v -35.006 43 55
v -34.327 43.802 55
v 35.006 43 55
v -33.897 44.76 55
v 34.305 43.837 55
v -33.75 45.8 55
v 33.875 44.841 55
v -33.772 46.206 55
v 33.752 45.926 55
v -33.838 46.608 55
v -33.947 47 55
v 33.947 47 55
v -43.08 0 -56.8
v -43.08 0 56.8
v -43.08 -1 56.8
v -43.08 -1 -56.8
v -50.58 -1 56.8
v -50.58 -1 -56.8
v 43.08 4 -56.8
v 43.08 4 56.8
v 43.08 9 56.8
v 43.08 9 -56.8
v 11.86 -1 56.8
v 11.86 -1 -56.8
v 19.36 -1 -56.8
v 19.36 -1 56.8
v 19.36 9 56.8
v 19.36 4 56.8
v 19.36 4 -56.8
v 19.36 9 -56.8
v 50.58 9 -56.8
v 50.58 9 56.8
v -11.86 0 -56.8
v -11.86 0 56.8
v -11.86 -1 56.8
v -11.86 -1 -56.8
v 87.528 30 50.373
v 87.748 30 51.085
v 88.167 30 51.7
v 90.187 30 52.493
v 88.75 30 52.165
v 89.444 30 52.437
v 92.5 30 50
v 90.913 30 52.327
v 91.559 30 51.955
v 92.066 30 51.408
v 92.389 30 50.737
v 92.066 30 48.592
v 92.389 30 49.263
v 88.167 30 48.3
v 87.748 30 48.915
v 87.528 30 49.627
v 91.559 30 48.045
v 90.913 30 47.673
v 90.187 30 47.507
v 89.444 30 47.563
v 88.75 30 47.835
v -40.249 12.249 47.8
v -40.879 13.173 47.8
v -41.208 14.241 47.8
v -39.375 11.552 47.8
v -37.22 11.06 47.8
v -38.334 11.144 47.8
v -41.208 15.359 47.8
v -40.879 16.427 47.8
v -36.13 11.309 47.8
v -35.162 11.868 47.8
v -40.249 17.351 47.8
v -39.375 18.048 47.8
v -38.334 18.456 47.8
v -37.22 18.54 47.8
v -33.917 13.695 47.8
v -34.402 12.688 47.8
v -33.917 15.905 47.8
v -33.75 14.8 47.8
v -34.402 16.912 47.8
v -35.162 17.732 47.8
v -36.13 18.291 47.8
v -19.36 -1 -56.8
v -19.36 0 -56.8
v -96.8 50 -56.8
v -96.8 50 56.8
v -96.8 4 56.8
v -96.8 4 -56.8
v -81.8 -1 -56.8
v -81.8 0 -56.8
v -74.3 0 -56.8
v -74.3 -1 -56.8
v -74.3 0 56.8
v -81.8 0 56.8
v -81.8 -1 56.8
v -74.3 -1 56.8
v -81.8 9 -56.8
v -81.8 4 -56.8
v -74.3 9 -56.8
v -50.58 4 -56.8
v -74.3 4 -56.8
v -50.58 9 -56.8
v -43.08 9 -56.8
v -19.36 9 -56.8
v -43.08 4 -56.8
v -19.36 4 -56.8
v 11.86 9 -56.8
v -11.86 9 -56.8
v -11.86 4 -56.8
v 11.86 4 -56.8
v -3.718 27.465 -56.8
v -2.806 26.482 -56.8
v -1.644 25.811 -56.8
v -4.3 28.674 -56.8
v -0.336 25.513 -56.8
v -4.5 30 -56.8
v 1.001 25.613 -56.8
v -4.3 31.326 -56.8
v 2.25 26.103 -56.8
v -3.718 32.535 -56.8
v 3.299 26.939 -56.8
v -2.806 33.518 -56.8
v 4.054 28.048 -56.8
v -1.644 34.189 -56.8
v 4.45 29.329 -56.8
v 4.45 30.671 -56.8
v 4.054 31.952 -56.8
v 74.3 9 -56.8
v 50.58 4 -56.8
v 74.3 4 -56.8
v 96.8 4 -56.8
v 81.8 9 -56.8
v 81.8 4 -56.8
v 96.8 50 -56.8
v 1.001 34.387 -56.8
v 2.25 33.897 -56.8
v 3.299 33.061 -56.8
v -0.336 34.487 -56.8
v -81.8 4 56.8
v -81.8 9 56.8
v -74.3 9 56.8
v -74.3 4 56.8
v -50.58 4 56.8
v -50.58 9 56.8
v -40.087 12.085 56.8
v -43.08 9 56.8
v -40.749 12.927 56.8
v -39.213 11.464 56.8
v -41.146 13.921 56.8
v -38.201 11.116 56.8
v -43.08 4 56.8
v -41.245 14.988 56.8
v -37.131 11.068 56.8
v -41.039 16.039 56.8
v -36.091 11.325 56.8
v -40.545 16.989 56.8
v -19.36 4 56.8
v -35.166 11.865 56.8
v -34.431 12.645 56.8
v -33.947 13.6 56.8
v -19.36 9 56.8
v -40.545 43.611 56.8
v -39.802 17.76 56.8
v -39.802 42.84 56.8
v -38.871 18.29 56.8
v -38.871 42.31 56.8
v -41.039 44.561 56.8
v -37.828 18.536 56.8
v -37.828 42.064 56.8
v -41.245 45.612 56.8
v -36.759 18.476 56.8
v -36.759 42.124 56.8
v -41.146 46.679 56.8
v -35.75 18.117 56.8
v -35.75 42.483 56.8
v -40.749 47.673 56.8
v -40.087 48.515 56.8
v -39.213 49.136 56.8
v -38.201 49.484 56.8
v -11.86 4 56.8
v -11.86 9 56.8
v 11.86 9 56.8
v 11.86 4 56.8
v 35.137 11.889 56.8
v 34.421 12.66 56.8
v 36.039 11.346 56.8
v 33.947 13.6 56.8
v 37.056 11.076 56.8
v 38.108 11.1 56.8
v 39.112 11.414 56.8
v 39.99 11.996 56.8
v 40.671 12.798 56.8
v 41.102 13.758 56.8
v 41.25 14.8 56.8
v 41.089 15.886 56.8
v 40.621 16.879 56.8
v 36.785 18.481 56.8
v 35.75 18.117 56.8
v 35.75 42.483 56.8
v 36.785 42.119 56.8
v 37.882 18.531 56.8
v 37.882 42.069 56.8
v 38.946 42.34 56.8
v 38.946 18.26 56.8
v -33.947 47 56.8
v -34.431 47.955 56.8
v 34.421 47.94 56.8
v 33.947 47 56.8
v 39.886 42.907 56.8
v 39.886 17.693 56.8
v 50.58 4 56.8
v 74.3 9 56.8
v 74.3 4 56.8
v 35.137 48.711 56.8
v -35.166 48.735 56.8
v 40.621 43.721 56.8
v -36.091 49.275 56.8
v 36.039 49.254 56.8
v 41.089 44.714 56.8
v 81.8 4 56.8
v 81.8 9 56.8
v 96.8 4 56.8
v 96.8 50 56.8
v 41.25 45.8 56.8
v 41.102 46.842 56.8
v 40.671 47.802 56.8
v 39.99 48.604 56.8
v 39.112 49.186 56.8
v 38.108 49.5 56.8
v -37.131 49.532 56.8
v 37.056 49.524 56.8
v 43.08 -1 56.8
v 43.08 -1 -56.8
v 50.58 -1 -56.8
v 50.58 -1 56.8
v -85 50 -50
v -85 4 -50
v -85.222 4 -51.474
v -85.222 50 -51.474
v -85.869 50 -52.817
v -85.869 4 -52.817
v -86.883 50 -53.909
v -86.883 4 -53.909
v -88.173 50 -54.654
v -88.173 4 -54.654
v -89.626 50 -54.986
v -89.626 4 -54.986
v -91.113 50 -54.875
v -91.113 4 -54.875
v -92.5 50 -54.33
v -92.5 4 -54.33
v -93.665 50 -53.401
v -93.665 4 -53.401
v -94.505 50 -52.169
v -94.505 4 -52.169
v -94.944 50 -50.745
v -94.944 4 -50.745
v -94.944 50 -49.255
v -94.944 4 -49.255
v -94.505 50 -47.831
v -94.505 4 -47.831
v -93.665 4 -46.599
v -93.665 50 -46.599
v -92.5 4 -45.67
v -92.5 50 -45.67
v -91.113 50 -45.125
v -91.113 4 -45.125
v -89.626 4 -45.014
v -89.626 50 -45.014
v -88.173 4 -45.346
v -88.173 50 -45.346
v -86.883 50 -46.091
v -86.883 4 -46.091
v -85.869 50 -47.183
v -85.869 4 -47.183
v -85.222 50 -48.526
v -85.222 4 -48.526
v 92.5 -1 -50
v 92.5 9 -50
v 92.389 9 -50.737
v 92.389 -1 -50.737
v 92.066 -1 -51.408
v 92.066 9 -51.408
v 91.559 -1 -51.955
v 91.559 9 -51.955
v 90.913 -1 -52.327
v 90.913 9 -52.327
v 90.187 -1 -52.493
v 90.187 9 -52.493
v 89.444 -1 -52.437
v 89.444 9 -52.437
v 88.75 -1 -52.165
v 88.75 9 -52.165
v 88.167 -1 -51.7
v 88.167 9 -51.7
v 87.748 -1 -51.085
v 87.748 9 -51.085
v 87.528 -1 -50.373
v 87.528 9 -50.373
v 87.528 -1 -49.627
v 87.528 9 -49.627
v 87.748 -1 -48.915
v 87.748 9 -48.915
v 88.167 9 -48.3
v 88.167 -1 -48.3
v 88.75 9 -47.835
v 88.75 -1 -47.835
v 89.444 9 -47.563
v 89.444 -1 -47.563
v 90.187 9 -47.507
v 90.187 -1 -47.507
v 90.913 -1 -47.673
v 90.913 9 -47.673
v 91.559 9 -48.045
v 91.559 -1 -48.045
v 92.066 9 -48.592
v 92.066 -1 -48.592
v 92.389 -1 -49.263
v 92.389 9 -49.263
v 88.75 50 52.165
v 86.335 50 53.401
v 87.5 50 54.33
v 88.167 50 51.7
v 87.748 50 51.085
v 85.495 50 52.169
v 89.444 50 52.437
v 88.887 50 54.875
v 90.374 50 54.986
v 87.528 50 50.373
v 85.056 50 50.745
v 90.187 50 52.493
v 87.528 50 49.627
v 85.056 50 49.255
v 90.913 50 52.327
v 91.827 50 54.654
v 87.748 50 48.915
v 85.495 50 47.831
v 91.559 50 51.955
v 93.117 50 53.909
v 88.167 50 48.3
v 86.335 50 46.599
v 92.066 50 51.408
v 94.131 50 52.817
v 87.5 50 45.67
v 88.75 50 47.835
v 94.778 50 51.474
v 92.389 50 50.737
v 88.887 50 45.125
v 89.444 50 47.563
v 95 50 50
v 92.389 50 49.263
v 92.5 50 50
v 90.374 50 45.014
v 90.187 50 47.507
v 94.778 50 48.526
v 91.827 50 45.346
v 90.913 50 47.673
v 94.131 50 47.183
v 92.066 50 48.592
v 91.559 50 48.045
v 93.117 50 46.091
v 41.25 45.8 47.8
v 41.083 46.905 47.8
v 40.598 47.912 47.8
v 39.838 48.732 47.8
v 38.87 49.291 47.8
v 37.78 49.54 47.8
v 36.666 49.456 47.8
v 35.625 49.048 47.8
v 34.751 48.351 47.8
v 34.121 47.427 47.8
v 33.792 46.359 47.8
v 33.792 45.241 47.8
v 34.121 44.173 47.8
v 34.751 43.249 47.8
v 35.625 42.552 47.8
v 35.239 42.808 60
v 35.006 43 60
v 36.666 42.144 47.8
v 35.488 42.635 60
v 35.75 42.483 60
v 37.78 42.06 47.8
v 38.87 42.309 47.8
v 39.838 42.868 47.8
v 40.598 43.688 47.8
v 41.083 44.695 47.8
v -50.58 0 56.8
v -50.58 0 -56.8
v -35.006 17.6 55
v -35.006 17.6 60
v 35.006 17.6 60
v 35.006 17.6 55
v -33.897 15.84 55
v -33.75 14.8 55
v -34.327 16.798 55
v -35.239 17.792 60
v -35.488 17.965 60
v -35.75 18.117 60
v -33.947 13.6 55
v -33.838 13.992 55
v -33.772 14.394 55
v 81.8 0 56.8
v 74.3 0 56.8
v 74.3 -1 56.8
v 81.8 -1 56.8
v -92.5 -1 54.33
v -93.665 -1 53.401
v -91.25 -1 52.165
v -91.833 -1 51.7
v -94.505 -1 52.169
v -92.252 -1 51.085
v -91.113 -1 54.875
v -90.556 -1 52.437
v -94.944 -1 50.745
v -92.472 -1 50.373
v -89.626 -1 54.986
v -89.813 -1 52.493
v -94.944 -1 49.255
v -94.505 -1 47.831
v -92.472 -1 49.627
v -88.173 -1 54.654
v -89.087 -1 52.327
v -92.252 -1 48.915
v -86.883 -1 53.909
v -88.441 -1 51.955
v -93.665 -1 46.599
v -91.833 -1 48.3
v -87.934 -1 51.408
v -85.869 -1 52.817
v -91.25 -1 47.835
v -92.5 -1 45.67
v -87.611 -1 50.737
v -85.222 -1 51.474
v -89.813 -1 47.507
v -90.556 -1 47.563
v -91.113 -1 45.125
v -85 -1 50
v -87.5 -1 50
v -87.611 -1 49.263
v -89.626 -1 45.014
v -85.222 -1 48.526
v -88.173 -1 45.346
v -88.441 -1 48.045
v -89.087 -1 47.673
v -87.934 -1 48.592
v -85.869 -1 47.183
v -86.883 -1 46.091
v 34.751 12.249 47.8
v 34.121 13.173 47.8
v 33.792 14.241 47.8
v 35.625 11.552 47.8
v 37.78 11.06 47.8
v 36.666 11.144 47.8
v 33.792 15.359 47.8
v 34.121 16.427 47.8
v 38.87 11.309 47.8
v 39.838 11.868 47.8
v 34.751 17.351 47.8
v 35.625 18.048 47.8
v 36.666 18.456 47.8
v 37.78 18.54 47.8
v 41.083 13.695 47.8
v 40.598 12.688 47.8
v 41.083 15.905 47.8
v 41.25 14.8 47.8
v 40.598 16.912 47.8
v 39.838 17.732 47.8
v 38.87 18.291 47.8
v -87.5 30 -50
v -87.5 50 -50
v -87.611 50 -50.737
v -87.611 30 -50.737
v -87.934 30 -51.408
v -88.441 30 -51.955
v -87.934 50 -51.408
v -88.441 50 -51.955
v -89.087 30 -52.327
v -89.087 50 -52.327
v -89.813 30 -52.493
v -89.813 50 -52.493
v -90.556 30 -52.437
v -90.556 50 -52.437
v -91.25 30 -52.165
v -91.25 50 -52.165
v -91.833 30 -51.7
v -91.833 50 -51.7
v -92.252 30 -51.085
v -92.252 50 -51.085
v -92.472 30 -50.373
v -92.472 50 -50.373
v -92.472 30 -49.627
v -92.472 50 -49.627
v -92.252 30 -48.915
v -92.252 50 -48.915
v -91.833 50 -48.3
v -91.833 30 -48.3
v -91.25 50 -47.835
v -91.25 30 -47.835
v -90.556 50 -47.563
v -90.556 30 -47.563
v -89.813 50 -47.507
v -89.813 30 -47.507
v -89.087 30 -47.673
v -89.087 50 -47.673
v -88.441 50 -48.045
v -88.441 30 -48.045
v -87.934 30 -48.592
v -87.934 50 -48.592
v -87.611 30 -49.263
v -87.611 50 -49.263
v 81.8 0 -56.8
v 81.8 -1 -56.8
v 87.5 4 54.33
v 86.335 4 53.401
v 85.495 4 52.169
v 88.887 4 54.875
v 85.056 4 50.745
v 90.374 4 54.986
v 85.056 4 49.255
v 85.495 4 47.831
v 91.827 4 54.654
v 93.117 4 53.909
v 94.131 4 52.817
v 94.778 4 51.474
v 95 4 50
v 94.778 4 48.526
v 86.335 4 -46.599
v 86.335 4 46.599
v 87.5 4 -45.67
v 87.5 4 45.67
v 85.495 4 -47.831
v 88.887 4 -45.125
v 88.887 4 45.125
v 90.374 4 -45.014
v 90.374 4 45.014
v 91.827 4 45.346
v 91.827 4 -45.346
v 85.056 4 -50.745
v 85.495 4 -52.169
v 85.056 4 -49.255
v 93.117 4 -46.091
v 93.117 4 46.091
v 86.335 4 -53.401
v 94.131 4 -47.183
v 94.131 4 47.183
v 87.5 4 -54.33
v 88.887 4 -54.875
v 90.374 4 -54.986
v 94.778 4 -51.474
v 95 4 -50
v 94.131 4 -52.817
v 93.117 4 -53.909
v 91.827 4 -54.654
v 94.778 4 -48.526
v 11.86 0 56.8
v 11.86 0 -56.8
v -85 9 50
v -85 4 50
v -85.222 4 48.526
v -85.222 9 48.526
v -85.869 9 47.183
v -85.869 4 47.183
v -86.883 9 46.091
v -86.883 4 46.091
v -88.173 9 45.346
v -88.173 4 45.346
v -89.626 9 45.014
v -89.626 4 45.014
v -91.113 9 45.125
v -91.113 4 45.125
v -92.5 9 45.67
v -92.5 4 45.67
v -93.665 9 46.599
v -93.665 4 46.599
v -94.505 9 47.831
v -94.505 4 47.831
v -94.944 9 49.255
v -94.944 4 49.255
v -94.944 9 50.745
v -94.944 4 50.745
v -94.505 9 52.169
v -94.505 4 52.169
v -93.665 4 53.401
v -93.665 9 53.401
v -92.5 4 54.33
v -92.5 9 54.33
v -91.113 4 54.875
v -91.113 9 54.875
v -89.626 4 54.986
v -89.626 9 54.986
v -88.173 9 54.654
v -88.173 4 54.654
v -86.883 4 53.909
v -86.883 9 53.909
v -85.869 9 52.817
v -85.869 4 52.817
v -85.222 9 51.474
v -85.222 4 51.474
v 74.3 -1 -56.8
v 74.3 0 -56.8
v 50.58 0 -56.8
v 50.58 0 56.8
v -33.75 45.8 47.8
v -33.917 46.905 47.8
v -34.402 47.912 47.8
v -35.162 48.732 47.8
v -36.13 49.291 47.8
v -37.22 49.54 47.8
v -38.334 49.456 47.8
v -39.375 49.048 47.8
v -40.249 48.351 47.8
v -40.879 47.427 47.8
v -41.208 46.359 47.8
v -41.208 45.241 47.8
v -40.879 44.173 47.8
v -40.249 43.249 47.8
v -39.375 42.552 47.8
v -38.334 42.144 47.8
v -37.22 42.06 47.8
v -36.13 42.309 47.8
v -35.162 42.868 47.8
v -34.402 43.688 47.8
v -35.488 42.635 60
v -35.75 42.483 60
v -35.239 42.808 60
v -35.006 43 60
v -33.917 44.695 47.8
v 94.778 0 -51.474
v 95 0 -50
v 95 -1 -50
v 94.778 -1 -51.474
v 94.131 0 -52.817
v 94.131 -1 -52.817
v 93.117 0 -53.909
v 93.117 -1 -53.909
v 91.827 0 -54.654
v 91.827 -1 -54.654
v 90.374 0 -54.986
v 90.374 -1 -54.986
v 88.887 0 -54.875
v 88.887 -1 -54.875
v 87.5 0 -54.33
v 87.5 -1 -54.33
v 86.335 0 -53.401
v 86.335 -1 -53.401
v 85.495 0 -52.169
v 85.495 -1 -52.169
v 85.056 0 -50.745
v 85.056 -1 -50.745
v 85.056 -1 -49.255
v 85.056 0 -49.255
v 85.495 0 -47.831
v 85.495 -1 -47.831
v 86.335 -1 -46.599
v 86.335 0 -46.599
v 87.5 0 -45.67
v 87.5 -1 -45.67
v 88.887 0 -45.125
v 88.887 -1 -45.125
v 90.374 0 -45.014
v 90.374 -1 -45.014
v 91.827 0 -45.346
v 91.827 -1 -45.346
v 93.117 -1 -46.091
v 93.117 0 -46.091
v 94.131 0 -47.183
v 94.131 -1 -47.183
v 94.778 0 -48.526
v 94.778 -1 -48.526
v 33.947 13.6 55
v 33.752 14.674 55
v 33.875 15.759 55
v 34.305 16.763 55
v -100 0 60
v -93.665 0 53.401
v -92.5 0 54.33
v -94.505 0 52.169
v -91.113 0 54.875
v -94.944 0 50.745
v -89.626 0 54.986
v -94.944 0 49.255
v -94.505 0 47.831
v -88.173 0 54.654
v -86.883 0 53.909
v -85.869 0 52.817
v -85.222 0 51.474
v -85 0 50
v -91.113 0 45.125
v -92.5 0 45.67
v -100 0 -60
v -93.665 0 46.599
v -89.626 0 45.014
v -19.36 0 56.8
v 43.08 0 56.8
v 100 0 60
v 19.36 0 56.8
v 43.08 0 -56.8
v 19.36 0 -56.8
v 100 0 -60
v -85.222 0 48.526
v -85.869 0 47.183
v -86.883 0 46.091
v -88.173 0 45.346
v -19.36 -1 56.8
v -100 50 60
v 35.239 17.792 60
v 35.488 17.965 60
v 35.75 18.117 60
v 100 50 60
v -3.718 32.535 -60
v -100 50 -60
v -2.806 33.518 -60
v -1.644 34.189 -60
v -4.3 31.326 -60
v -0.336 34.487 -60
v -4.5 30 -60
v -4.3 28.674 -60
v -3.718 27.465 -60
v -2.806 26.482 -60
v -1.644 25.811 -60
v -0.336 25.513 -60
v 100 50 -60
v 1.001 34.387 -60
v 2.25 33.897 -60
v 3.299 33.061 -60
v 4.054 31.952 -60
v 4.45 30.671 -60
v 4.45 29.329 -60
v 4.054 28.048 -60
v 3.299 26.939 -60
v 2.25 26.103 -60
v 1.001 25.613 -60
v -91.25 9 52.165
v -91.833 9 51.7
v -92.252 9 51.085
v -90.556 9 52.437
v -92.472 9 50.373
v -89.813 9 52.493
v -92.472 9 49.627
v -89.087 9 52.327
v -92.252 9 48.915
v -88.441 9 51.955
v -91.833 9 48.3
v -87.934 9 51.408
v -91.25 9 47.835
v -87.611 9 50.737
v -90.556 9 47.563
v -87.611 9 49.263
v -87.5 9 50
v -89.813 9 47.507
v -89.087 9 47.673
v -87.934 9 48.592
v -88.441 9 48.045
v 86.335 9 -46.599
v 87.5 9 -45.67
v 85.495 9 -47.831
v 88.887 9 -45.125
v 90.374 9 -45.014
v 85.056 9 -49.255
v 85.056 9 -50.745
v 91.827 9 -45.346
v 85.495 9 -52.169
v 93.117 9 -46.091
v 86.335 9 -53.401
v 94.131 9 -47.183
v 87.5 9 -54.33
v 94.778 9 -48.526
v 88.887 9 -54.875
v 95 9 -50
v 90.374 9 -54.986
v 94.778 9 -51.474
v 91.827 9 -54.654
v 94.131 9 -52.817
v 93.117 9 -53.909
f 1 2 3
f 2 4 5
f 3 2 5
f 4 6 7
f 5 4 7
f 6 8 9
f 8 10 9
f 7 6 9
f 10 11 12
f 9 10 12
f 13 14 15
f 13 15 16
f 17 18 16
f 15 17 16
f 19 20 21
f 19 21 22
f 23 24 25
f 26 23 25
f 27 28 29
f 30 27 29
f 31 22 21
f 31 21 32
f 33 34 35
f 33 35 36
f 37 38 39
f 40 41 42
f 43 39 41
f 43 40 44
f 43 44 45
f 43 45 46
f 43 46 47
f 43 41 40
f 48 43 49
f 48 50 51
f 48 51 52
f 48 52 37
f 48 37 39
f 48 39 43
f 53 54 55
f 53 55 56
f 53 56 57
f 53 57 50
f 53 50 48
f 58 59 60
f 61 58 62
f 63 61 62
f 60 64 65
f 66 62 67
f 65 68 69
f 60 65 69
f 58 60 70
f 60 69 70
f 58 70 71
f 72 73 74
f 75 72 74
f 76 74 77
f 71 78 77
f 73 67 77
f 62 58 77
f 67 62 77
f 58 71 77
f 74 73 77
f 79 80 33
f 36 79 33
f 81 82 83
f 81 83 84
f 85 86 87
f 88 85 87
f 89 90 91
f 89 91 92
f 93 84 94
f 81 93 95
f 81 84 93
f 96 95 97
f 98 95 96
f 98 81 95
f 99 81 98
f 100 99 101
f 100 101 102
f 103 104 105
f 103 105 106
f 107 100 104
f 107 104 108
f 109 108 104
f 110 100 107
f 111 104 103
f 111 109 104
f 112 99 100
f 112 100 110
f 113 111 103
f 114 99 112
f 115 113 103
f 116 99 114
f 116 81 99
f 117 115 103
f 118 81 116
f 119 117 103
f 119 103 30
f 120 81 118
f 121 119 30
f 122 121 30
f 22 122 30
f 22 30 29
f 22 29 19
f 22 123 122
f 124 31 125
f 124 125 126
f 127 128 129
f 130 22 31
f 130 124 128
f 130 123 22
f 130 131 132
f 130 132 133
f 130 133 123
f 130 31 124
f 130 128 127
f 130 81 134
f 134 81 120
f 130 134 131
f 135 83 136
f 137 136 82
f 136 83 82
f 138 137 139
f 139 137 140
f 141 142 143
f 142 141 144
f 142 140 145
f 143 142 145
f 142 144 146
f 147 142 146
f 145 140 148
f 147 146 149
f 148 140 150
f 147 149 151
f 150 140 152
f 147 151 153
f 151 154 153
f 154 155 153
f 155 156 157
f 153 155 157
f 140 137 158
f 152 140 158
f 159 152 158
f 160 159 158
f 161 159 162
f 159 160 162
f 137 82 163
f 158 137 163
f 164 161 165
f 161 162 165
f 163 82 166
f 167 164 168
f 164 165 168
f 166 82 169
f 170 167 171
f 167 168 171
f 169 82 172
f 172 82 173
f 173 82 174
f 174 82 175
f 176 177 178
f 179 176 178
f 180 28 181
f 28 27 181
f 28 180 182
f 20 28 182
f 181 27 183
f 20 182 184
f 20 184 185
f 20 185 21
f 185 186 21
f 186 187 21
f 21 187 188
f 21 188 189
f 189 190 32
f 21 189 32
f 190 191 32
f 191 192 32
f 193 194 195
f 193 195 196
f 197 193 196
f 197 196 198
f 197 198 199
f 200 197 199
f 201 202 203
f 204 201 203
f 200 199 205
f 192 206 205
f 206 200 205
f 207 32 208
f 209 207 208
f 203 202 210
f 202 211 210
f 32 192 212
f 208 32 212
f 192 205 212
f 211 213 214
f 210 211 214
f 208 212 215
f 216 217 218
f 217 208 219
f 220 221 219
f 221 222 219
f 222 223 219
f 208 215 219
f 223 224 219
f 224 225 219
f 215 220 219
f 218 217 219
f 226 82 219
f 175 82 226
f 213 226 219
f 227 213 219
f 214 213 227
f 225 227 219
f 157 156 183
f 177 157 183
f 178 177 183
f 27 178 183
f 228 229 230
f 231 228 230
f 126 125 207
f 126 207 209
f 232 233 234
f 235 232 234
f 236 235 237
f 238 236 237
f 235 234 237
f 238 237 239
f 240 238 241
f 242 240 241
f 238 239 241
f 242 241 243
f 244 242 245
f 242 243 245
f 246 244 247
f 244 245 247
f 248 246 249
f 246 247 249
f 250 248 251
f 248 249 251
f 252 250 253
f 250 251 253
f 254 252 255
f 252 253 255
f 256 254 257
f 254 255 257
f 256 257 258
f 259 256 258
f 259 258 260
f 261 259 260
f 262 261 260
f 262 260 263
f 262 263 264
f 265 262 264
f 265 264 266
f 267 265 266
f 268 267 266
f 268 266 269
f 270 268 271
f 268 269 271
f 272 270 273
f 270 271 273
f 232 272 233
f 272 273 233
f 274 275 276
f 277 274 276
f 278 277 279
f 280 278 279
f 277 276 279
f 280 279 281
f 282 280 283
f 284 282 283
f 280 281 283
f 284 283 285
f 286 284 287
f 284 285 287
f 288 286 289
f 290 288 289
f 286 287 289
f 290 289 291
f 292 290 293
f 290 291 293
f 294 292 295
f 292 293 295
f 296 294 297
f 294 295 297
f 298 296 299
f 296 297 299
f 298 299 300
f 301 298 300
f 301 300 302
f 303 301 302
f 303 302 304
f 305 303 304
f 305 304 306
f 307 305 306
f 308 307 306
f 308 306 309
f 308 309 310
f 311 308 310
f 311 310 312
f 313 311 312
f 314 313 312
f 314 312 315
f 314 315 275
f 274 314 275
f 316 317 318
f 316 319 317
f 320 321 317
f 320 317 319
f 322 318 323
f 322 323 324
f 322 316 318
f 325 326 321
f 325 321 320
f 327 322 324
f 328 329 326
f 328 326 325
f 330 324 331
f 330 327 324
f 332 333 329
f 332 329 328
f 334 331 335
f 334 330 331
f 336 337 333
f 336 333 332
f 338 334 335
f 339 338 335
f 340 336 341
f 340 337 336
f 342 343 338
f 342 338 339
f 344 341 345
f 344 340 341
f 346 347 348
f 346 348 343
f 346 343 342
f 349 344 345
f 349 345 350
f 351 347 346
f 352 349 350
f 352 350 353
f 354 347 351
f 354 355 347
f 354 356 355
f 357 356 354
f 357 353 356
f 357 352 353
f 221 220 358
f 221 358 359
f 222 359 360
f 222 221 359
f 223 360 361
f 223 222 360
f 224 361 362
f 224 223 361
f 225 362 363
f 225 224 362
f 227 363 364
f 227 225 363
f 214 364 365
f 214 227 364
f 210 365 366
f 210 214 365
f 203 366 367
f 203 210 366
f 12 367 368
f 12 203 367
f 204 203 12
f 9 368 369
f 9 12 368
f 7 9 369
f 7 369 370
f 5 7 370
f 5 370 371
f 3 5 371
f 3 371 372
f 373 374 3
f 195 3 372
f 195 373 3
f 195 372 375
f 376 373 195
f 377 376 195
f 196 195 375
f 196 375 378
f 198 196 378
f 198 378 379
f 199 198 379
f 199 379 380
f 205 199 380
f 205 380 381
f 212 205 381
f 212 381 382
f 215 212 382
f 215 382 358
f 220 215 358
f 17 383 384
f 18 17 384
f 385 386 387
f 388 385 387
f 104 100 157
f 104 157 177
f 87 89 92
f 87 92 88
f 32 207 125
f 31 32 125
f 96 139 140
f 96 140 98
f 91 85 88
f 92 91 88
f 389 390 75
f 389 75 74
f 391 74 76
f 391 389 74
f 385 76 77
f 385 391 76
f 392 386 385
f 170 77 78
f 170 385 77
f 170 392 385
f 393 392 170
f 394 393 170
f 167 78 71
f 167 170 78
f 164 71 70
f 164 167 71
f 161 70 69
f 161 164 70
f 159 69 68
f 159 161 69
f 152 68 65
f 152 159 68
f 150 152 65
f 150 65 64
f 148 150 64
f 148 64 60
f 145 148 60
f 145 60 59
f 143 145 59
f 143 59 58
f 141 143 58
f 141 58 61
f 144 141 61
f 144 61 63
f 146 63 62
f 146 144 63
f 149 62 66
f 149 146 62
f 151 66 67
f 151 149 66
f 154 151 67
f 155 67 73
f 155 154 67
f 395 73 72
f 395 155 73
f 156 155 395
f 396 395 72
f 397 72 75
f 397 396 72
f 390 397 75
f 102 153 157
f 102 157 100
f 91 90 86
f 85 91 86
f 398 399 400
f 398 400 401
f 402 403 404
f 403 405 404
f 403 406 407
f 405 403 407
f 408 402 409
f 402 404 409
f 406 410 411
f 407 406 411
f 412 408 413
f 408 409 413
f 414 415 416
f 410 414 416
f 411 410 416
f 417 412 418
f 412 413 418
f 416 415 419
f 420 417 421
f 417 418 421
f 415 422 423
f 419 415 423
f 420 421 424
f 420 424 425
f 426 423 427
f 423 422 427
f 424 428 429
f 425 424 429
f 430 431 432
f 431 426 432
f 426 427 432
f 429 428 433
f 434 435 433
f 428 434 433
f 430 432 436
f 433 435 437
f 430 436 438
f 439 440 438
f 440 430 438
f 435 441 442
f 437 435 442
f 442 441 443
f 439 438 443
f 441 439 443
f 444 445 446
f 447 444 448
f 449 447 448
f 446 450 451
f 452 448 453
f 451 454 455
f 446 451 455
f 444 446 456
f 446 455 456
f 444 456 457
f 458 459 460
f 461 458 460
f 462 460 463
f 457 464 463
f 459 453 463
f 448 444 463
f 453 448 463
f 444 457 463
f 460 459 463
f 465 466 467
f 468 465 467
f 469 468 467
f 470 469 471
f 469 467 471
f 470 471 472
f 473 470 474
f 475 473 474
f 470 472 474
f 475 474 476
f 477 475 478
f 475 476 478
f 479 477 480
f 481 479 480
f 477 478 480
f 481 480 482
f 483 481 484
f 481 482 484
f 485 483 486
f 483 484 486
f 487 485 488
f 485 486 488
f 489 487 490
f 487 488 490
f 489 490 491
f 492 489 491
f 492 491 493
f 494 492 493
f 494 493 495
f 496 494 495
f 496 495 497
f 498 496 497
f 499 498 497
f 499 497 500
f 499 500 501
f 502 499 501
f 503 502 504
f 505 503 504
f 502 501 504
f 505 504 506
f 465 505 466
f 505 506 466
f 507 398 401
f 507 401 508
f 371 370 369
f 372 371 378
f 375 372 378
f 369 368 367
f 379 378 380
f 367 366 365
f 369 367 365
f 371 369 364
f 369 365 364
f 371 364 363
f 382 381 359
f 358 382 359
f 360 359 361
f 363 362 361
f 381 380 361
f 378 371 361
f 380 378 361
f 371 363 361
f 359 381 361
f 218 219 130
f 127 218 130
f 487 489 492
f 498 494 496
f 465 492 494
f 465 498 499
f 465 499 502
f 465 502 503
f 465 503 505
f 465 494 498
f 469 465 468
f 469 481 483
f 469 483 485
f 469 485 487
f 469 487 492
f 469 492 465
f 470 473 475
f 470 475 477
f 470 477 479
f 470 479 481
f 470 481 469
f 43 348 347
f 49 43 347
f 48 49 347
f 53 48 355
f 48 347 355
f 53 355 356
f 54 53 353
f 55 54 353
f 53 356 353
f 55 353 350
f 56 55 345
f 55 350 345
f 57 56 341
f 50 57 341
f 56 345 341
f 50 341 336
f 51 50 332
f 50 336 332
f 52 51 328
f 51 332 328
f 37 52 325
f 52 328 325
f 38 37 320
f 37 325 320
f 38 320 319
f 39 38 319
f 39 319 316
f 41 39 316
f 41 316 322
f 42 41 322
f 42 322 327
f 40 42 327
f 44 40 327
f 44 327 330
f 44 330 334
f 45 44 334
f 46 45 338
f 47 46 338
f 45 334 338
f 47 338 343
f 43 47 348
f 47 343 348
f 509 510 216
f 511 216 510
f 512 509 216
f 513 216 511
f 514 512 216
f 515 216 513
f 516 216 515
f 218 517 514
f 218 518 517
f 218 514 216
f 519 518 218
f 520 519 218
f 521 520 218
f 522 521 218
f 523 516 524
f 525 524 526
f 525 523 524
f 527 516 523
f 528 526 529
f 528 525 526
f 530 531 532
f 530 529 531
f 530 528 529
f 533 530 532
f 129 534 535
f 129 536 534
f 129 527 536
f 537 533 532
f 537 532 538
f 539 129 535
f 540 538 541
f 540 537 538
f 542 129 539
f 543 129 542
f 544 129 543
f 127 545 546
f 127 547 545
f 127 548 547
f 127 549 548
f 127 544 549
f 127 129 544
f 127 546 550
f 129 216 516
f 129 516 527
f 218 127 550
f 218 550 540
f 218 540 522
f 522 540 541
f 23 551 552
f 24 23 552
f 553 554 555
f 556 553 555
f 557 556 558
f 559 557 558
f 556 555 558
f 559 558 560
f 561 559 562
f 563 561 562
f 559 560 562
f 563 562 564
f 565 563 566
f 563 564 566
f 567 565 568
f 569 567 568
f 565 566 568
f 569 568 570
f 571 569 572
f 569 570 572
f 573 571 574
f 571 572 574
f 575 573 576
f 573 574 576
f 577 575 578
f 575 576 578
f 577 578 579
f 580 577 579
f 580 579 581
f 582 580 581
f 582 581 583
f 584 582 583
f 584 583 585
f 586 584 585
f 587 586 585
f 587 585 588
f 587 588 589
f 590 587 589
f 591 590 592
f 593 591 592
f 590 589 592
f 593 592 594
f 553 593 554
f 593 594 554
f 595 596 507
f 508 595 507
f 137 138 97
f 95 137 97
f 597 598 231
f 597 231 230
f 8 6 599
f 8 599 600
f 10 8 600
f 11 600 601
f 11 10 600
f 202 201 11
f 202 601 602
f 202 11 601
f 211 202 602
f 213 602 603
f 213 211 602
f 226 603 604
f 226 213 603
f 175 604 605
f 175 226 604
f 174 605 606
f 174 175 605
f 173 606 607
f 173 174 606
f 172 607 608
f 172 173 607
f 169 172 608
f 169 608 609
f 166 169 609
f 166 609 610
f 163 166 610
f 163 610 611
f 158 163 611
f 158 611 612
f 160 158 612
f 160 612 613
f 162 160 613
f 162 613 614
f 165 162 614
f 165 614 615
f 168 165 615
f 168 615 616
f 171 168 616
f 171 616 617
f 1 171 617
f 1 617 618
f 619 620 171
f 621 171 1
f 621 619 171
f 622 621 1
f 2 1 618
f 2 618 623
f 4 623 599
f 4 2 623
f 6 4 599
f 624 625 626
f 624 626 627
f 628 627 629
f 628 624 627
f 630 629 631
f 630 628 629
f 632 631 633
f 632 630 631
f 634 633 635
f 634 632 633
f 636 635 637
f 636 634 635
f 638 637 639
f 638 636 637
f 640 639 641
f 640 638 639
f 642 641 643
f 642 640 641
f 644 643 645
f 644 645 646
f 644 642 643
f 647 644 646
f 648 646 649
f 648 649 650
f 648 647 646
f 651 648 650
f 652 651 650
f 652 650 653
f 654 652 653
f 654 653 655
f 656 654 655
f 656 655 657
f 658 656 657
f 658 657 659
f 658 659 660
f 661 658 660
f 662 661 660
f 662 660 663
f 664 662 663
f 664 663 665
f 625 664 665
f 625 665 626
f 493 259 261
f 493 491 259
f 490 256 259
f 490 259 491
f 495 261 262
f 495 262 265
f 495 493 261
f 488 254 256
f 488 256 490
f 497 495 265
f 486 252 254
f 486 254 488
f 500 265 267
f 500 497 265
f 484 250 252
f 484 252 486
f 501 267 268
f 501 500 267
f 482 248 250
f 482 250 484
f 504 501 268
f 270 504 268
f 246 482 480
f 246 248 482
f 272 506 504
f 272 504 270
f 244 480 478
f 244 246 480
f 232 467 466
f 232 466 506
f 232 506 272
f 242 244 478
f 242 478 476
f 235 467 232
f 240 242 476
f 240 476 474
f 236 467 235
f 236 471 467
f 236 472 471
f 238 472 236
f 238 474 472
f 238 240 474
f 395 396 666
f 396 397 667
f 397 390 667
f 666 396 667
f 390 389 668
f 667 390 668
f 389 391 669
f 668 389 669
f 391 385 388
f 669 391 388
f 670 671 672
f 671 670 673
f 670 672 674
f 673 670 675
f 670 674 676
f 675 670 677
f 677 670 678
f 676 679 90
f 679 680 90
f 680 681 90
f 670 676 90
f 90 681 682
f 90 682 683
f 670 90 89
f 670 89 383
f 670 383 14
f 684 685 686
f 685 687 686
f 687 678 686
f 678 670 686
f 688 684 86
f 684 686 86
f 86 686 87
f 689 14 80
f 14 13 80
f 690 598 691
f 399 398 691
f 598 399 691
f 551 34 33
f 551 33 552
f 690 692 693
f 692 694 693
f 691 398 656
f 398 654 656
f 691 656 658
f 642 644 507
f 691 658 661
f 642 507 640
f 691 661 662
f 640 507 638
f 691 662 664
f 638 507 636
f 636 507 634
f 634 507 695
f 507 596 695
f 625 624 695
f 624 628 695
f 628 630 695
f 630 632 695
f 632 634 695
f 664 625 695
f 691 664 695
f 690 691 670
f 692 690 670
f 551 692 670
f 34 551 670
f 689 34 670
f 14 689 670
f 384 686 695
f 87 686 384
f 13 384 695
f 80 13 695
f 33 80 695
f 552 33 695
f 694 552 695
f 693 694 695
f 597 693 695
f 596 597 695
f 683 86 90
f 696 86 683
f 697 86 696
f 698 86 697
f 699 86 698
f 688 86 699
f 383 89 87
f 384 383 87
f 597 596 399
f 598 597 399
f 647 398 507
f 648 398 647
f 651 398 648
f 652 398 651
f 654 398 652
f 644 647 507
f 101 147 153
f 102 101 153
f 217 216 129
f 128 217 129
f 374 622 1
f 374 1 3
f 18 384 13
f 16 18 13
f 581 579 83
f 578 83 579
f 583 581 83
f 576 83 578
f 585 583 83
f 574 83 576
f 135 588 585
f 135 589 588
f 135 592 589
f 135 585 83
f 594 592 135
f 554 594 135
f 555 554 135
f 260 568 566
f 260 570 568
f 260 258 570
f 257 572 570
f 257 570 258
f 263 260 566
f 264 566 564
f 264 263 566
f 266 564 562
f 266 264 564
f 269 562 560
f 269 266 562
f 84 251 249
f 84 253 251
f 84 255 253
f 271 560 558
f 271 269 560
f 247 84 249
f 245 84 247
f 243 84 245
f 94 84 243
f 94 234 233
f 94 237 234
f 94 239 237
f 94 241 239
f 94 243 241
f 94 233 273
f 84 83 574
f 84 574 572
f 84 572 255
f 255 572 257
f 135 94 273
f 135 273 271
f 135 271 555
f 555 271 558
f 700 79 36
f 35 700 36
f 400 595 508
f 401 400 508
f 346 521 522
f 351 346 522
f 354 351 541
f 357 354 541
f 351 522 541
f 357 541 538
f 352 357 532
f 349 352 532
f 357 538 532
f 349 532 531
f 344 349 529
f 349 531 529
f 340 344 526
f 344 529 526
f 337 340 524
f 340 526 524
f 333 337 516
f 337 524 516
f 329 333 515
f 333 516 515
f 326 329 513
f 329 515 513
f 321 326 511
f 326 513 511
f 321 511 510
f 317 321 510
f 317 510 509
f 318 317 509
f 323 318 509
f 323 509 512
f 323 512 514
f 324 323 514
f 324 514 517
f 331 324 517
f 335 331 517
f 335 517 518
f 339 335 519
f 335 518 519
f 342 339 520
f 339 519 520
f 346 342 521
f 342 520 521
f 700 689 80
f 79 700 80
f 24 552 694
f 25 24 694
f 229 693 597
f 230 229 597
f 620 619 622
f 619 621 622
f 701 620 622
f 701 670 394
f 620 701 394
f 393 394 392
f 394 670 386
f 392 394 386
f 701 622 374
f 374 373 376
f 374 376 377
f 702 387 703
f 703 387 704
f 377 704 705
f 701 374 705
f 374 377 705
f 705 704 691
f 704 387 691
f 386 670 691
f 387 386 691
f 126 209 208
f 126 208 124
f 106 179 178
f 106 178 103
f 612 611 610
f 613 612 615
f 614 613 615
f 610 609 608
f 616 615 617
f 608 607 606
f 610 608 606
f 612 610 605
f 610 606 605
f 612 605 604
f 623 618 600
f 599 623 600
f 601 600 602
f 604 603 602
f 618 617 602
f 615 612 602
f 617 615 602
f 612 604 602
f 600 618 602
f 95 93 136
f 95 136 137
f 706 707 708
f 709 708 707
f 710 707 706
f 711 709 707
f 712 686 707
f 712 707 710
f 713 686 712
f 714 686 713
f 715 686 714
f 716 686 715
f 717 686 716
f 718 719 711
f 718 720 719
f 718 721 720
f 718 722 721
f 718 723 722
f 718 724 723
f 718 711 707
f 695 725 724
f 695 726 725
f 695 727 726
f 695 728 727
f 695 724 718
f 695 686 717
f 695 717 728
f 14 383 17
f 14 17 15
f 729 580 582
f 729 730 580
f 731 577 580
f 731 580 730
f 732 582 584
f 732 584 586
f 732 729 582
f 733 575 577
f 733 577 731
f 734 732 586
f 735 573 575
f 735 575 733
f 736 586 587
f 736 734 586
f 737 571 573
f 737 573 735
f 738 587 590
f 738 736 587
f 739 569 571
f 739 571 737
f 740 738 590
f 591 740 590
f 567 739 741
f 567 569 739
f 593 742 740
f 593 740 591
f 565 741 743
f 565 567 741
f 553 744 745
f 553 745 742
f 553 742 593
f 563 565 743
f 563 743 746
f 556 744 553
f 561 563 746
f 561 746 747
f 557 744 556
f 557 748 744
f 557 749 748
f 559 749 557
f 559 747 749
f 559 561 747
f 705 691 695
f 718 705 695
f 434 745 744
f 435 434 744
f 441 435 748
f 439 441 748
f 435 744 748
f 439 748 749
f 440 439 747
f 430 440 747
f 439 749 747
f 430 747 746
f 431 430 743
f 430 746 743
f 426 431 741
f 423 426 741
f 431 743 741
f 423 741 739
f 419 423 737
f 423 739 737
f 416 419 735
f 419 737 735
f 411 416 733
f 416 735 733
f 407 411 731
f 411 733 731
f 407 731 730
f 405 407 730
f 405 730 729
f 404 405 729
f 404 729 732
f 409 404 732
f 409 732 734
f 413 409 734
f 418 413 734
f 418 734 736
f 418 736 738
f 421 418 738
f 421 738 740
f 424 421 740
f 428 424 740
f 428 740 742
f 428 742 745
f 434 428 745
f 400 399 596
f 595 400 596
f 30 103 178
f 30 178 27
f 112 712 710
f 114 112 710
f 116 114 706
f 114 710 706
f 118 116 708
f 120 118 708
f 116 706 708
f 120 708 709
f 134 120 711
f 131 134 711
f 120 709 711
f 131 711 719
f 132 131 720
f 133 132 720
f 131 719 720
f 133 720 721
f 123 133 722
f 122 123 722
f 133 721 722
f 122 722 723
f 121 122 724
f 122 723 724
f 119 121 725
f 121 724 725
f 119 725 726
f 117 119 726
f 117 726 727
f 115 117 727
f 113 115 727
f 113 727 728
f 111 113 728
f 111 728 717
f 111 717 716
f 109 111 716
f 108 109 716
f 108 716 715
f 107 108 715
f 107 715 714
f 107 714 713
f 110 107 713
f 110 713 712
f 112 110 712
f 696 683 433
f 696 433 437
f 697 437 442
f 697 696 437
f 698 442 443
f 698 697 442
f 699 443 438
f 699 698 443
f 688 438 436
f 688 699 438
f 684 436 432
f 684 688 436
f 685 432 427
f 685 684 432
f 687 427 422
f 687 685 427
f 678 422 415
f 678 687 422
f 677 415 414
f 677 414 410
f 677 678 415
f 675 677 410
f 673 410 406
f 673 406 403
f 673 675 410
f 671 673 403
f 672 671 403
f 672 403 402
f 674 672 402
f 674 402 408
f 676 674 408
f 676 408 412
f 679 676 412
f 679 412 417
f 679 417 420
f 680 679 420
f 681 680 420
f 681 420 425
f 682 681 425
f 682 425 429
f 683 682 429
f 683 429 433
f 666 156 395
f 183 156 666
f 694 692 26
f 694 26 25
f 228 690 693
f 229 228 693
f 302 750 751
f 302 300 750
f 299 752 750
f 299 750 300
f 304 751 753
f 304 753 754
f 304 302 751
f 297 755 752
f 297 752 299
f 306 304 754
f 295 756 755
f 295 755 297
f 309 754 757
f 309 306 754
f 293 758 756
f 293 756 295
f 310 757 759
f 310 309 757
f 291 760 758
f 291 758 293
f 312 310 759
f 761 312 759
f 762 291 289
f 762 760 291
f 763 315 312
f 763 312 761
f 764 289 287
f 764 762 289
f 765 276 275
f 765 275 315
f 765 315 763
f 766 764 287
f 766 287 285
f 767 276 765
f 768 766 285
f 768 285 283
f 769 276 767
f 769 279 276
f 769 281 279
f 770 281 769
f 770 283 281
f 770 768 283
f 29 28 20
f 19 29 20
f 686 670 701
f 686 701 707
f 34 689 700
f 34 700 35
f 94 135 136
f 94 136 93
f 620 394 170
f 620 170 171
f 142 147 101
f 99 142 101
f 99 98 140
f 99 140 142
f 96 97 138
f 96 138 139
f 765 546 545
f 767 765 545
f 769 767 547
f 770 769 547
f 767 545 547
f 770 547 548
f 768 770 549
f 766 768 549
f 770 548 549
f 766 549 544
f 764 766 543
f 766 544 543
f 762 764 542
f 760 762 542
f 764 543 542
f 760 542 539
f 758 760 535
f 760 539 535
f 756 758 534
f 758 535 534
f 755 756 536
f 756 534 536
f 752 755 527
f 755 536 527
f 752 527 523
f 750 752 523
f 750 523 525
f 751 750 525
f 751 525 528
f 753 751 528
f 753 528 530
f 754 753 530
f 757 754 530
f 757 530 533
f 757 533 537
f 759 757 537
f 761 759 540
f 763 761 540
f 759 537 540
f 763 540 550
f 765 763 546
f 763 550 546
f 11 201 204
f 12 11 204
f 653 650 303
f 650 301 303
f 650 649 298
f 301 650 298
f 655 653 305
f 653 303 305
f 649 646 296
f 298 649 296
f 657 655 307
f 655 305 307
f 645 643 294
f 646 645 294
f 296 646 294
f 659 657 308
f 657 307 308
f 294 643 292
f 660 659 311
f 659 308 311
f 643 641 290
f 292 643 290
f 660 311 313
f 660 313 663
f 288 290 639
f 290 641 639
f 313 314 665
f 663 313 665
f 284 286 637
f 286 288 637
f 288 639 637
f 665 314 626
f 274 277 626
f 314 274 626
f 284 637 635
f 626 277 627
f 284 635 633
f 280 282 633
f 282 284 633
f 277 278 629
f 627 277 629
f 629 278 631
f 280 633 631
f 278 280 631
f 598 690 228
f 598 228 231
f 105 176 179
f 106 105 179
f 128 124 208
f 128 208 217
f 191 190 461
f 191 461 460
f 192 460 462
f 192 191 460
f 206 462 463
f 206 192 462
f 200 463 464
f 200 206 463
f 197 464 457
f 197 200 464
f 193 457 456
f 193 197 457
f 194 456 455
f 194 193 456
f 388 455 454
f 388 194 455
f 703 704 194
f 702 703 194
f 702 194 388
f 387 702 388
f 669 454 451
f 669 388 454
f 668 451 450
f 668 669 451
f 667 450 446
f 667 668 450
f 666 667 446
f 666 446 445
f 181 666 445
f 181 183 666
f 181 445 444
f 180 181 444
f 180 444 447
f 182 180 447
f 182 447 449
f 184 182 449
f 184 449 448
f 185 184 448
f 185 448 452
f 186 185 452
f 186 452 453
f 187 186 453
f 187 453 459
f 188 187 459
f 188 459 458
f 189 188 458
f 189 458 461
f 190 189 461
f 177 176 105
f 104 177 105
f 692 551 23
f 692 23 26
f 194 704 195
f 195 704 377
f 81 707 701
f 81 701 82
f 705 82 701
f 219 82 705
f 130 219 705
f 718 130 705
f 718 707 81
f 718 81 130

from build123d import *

# Parameters (mm, degrees)
CROQUIS1_W                   = 200
CROQUIS1_H                   = 120
SALIENTE_EXTRUIR1_DEPTH      = 50
CROQUIS2_W                   = 193.6
CROQUIS2_H                   = 113.6
CORTAR_EXTRUIR1_DEPTH        = 46
CROQUIS3_W                   = 71.5
CROQUIS3_H                   = 25.4
CORTAR_EXTRUIR2_DEPTH        = 3.5
CROQUIS4_R                   = 3.75
SALIENTE_EXTRUIR2_DEPTH      = 12.2
CROQUIS5_W                   = 71.5
CROQUIS5_H                   = 4
SALIENTE_EXTRUIR3_DEPTH      = 5
SALIENTE_EXTRUIR4_DEPTH      = 5
SALIENTE_EXTRUIR4_DEPTH_BACK = 5
CROQUIS6_W                   = 7.5
CROQUIS6_H                   = 113.6
CROQUIS7_R                   = 4.5
CORTAR_EXTRUIR3_DEPTH        = 3.3
CROQUIS6_5_R                 = 5
SALIENTE_EXTRUIR5_DEPTH      = 46
SALIENTE_EXTRUIR6_DEPTH      = 5
SALIENTE_EXTRUIR6_DEPTH_BACK = 5
CROQUIS6_6_R                 = 5
CROQUIS8_R                   = 2.5
CORTAR_EXTRUIR4_DEPTH        = 20
CROQUIS9_R                   = 2.5
CORTAR_EXTRUIR5_DEPTH        = 124.616341962


with BuildPart() as part:
    # Croquis1 → Saliente-Extruir1 (new body)
    with BuildSketch(Plane(origin=(0, 0, 0), x_dir=(1, 0, 0), z_dir=(0, 1, 0))):
        Rectangle(CROQUIS1_W, CROQUIS1_H)
    extrude(amount=SALIENTE_EXTRUIR1_DEPTH)

    # Croquis2 → Cortar-Extruir1 (cut)
    with BuildSketch(Plane(origin=(0, 50, 0), x_dir=(1, 0, 0), z_dir=(0, 1, 0))):
        Rectangle(CROQUIS2_W, CROQUIS2_H)
    extrude(amount=-CORTAR_EXTRUIR1_DEPTH, mode=Mode.SUBTRACT)

    # Croquis3 → Cortar-Extruir2 (cut)
    with BuildSketch(Plane.XY.offset(60)):
        with Locations((0, 30.3)):
            Rectangle(CROQUIS3_W, CROQUIS3_H)
    extrude(amount=-CORTAR_EXTRUIR2_DEPTH, mode=Mode.SUBTRACT)

    # Croquis4 → Saliente-Extruir2 (add)
    with BuildSketch(Plane.XY.offset(60)):
        with Locations((-37.5, 45.8)):
            Circle(CROQUIS4_R)
        with Locations((37.5, 45.8)):
            Circle(CROQUIS4_R)
        with Locations((37.5, 14.8)):
            Circle(CROQUIS4_R)
        with Locations((-37.5, 14.8)):
            Circle(CROQUIS4_R)
    extrude(amount=-SALIENTE_EXTRUIR2_DEPTH)

    # Croquis5 → Saliente-Extruir3 (add)
    with BuildSketch(Plane.XY.offset(60)):
        with Locations((0, 15.6)):
            Rectangle(CROQUIS5_W, CROQUIS5_H)
        with Locations((0, 45)):
            Rectangle(CROQUIS5_W, CROQUIS5_H)
    extrude(amount=-SALIENTE_EXTRUIR3_DEPTH)

    # Croquis6 → Saliente-Extruir4 (add, two sides: drawn at the far end of the back side and taken through both)
    with BuildSketch(Plane(origin=(0, 4, 0), x_dir=(1, 0, 0), z_dir=(0, 1, 0)).offset(-SALIENTE_EXTRUIR4_DEPTH_BACK)):
        with Locations((-78.05, 0)):
            Rectangle(CROQUIS6_W, CROQUIS6_H)
        with Locations((-46.83, 0)):
            Rectangle(CROQUIS6_W, CROQUIS6_H)
        with Locations((-15.61, 0)):
            Rectangle(CROQUIS6_W, CROQUIS6_H)
        with Locations((15.61, 0)):
            Rectangle(CROQUIS6_W, CROQUIS6_H)
        with Locations((46.83, 0)):
            Rectangle(CROQUIS6_W, CROQUIS6_H)
        with Locations((78.05, 0)):
            Rectangle(CROQUIS6_W, CROQUIS6_H)
    extrude(amount=SALIENTE_EXTRUIR4_DEPTH + SALIENTE_EXTRUIR4_DEPTH_BACK)

    # Croquis7 → Cortar-Extruir3 (cut)
    with BuildSketch(Plane(origin=(0, 0, -60), x_dir=(-1, 0, 0), z_dir=(0, 0, -1))):
        with Locations((0, 30)):
            Circle(CROQUIS7_R)
    extrude(amount=-CORTAR_EXTRUIR3_DEPTH, mode=Mode.SUBTRACT)

    # Croquis6<5> → Saliente-Extruir5 (add)
    with BuildSketch(Plane(origin=(0, 4, 0), x_dir=(1, 0, 0), z_dir=(0, 1, 0))):
        with Locations((-90, 50)):
            Circle(CROQUIS6_5_R)
        with Locations((90, -50)):
            Circle(CROQUIS6_5_R)
    extrude(amount=SALIENTE_EXTRUIR5_DEPTH)

    # Croquis6<6> → Saliente-Extruir6 (add, two sides: drawn at the far end of the back side and taken through both)
    with BuildSketch(Plane(origin=(0, 4, 0), x_dir=(1, 0, 0), z_dir=(0, 1, 0)).offset(-SALIENTE_EXTRUIR6_DEPTH_BACK)):
        with Locations((90, 50)):
            Circle(CROQUIS6_6_R)
        with Locations((-90, -50)):
            Circle(CROQUIS6_6_R)
    extrude(amount=SALIENTE_EXTRUIR6_DEPTH + SALIENTE_EXTRUIR6_DEPTH_BACK)

    # Croquis8 → Cortar-Extruir4 (cut)
    with BuildSketch(Plane(origin=(0, 50, 0), x_dir=(1, 0, 0), z_dir=(0, 1, 0))):
        with Locations((-90, 50)):
            Circle(CROQUIS8_R)
        with Locations((90, -50)):
            Circle(CROQUIS8_R)
    extrude(amount=-CORTAR_EXTRUIR4_DEPTH, mode=Mode.SUBTRACT)

    # Croquis9 → Cortar-Extruir5 (cut, through all)
    with BuildSketch(Plane(origin=(0, 9, 0), x_dir=(1, 0, 0), z_dir=(0, 1, 0))):
        with Locations((-90, -50)):
            Circle(CROQUIS9_R)
        with Locations((90, 50)):
            Circle(CROQUIS9_R)
    extrude(amount=-CORTAR_EXTRUIR5_DEPTH, mode=Mode.SUBTRACT)


solid = part.part
